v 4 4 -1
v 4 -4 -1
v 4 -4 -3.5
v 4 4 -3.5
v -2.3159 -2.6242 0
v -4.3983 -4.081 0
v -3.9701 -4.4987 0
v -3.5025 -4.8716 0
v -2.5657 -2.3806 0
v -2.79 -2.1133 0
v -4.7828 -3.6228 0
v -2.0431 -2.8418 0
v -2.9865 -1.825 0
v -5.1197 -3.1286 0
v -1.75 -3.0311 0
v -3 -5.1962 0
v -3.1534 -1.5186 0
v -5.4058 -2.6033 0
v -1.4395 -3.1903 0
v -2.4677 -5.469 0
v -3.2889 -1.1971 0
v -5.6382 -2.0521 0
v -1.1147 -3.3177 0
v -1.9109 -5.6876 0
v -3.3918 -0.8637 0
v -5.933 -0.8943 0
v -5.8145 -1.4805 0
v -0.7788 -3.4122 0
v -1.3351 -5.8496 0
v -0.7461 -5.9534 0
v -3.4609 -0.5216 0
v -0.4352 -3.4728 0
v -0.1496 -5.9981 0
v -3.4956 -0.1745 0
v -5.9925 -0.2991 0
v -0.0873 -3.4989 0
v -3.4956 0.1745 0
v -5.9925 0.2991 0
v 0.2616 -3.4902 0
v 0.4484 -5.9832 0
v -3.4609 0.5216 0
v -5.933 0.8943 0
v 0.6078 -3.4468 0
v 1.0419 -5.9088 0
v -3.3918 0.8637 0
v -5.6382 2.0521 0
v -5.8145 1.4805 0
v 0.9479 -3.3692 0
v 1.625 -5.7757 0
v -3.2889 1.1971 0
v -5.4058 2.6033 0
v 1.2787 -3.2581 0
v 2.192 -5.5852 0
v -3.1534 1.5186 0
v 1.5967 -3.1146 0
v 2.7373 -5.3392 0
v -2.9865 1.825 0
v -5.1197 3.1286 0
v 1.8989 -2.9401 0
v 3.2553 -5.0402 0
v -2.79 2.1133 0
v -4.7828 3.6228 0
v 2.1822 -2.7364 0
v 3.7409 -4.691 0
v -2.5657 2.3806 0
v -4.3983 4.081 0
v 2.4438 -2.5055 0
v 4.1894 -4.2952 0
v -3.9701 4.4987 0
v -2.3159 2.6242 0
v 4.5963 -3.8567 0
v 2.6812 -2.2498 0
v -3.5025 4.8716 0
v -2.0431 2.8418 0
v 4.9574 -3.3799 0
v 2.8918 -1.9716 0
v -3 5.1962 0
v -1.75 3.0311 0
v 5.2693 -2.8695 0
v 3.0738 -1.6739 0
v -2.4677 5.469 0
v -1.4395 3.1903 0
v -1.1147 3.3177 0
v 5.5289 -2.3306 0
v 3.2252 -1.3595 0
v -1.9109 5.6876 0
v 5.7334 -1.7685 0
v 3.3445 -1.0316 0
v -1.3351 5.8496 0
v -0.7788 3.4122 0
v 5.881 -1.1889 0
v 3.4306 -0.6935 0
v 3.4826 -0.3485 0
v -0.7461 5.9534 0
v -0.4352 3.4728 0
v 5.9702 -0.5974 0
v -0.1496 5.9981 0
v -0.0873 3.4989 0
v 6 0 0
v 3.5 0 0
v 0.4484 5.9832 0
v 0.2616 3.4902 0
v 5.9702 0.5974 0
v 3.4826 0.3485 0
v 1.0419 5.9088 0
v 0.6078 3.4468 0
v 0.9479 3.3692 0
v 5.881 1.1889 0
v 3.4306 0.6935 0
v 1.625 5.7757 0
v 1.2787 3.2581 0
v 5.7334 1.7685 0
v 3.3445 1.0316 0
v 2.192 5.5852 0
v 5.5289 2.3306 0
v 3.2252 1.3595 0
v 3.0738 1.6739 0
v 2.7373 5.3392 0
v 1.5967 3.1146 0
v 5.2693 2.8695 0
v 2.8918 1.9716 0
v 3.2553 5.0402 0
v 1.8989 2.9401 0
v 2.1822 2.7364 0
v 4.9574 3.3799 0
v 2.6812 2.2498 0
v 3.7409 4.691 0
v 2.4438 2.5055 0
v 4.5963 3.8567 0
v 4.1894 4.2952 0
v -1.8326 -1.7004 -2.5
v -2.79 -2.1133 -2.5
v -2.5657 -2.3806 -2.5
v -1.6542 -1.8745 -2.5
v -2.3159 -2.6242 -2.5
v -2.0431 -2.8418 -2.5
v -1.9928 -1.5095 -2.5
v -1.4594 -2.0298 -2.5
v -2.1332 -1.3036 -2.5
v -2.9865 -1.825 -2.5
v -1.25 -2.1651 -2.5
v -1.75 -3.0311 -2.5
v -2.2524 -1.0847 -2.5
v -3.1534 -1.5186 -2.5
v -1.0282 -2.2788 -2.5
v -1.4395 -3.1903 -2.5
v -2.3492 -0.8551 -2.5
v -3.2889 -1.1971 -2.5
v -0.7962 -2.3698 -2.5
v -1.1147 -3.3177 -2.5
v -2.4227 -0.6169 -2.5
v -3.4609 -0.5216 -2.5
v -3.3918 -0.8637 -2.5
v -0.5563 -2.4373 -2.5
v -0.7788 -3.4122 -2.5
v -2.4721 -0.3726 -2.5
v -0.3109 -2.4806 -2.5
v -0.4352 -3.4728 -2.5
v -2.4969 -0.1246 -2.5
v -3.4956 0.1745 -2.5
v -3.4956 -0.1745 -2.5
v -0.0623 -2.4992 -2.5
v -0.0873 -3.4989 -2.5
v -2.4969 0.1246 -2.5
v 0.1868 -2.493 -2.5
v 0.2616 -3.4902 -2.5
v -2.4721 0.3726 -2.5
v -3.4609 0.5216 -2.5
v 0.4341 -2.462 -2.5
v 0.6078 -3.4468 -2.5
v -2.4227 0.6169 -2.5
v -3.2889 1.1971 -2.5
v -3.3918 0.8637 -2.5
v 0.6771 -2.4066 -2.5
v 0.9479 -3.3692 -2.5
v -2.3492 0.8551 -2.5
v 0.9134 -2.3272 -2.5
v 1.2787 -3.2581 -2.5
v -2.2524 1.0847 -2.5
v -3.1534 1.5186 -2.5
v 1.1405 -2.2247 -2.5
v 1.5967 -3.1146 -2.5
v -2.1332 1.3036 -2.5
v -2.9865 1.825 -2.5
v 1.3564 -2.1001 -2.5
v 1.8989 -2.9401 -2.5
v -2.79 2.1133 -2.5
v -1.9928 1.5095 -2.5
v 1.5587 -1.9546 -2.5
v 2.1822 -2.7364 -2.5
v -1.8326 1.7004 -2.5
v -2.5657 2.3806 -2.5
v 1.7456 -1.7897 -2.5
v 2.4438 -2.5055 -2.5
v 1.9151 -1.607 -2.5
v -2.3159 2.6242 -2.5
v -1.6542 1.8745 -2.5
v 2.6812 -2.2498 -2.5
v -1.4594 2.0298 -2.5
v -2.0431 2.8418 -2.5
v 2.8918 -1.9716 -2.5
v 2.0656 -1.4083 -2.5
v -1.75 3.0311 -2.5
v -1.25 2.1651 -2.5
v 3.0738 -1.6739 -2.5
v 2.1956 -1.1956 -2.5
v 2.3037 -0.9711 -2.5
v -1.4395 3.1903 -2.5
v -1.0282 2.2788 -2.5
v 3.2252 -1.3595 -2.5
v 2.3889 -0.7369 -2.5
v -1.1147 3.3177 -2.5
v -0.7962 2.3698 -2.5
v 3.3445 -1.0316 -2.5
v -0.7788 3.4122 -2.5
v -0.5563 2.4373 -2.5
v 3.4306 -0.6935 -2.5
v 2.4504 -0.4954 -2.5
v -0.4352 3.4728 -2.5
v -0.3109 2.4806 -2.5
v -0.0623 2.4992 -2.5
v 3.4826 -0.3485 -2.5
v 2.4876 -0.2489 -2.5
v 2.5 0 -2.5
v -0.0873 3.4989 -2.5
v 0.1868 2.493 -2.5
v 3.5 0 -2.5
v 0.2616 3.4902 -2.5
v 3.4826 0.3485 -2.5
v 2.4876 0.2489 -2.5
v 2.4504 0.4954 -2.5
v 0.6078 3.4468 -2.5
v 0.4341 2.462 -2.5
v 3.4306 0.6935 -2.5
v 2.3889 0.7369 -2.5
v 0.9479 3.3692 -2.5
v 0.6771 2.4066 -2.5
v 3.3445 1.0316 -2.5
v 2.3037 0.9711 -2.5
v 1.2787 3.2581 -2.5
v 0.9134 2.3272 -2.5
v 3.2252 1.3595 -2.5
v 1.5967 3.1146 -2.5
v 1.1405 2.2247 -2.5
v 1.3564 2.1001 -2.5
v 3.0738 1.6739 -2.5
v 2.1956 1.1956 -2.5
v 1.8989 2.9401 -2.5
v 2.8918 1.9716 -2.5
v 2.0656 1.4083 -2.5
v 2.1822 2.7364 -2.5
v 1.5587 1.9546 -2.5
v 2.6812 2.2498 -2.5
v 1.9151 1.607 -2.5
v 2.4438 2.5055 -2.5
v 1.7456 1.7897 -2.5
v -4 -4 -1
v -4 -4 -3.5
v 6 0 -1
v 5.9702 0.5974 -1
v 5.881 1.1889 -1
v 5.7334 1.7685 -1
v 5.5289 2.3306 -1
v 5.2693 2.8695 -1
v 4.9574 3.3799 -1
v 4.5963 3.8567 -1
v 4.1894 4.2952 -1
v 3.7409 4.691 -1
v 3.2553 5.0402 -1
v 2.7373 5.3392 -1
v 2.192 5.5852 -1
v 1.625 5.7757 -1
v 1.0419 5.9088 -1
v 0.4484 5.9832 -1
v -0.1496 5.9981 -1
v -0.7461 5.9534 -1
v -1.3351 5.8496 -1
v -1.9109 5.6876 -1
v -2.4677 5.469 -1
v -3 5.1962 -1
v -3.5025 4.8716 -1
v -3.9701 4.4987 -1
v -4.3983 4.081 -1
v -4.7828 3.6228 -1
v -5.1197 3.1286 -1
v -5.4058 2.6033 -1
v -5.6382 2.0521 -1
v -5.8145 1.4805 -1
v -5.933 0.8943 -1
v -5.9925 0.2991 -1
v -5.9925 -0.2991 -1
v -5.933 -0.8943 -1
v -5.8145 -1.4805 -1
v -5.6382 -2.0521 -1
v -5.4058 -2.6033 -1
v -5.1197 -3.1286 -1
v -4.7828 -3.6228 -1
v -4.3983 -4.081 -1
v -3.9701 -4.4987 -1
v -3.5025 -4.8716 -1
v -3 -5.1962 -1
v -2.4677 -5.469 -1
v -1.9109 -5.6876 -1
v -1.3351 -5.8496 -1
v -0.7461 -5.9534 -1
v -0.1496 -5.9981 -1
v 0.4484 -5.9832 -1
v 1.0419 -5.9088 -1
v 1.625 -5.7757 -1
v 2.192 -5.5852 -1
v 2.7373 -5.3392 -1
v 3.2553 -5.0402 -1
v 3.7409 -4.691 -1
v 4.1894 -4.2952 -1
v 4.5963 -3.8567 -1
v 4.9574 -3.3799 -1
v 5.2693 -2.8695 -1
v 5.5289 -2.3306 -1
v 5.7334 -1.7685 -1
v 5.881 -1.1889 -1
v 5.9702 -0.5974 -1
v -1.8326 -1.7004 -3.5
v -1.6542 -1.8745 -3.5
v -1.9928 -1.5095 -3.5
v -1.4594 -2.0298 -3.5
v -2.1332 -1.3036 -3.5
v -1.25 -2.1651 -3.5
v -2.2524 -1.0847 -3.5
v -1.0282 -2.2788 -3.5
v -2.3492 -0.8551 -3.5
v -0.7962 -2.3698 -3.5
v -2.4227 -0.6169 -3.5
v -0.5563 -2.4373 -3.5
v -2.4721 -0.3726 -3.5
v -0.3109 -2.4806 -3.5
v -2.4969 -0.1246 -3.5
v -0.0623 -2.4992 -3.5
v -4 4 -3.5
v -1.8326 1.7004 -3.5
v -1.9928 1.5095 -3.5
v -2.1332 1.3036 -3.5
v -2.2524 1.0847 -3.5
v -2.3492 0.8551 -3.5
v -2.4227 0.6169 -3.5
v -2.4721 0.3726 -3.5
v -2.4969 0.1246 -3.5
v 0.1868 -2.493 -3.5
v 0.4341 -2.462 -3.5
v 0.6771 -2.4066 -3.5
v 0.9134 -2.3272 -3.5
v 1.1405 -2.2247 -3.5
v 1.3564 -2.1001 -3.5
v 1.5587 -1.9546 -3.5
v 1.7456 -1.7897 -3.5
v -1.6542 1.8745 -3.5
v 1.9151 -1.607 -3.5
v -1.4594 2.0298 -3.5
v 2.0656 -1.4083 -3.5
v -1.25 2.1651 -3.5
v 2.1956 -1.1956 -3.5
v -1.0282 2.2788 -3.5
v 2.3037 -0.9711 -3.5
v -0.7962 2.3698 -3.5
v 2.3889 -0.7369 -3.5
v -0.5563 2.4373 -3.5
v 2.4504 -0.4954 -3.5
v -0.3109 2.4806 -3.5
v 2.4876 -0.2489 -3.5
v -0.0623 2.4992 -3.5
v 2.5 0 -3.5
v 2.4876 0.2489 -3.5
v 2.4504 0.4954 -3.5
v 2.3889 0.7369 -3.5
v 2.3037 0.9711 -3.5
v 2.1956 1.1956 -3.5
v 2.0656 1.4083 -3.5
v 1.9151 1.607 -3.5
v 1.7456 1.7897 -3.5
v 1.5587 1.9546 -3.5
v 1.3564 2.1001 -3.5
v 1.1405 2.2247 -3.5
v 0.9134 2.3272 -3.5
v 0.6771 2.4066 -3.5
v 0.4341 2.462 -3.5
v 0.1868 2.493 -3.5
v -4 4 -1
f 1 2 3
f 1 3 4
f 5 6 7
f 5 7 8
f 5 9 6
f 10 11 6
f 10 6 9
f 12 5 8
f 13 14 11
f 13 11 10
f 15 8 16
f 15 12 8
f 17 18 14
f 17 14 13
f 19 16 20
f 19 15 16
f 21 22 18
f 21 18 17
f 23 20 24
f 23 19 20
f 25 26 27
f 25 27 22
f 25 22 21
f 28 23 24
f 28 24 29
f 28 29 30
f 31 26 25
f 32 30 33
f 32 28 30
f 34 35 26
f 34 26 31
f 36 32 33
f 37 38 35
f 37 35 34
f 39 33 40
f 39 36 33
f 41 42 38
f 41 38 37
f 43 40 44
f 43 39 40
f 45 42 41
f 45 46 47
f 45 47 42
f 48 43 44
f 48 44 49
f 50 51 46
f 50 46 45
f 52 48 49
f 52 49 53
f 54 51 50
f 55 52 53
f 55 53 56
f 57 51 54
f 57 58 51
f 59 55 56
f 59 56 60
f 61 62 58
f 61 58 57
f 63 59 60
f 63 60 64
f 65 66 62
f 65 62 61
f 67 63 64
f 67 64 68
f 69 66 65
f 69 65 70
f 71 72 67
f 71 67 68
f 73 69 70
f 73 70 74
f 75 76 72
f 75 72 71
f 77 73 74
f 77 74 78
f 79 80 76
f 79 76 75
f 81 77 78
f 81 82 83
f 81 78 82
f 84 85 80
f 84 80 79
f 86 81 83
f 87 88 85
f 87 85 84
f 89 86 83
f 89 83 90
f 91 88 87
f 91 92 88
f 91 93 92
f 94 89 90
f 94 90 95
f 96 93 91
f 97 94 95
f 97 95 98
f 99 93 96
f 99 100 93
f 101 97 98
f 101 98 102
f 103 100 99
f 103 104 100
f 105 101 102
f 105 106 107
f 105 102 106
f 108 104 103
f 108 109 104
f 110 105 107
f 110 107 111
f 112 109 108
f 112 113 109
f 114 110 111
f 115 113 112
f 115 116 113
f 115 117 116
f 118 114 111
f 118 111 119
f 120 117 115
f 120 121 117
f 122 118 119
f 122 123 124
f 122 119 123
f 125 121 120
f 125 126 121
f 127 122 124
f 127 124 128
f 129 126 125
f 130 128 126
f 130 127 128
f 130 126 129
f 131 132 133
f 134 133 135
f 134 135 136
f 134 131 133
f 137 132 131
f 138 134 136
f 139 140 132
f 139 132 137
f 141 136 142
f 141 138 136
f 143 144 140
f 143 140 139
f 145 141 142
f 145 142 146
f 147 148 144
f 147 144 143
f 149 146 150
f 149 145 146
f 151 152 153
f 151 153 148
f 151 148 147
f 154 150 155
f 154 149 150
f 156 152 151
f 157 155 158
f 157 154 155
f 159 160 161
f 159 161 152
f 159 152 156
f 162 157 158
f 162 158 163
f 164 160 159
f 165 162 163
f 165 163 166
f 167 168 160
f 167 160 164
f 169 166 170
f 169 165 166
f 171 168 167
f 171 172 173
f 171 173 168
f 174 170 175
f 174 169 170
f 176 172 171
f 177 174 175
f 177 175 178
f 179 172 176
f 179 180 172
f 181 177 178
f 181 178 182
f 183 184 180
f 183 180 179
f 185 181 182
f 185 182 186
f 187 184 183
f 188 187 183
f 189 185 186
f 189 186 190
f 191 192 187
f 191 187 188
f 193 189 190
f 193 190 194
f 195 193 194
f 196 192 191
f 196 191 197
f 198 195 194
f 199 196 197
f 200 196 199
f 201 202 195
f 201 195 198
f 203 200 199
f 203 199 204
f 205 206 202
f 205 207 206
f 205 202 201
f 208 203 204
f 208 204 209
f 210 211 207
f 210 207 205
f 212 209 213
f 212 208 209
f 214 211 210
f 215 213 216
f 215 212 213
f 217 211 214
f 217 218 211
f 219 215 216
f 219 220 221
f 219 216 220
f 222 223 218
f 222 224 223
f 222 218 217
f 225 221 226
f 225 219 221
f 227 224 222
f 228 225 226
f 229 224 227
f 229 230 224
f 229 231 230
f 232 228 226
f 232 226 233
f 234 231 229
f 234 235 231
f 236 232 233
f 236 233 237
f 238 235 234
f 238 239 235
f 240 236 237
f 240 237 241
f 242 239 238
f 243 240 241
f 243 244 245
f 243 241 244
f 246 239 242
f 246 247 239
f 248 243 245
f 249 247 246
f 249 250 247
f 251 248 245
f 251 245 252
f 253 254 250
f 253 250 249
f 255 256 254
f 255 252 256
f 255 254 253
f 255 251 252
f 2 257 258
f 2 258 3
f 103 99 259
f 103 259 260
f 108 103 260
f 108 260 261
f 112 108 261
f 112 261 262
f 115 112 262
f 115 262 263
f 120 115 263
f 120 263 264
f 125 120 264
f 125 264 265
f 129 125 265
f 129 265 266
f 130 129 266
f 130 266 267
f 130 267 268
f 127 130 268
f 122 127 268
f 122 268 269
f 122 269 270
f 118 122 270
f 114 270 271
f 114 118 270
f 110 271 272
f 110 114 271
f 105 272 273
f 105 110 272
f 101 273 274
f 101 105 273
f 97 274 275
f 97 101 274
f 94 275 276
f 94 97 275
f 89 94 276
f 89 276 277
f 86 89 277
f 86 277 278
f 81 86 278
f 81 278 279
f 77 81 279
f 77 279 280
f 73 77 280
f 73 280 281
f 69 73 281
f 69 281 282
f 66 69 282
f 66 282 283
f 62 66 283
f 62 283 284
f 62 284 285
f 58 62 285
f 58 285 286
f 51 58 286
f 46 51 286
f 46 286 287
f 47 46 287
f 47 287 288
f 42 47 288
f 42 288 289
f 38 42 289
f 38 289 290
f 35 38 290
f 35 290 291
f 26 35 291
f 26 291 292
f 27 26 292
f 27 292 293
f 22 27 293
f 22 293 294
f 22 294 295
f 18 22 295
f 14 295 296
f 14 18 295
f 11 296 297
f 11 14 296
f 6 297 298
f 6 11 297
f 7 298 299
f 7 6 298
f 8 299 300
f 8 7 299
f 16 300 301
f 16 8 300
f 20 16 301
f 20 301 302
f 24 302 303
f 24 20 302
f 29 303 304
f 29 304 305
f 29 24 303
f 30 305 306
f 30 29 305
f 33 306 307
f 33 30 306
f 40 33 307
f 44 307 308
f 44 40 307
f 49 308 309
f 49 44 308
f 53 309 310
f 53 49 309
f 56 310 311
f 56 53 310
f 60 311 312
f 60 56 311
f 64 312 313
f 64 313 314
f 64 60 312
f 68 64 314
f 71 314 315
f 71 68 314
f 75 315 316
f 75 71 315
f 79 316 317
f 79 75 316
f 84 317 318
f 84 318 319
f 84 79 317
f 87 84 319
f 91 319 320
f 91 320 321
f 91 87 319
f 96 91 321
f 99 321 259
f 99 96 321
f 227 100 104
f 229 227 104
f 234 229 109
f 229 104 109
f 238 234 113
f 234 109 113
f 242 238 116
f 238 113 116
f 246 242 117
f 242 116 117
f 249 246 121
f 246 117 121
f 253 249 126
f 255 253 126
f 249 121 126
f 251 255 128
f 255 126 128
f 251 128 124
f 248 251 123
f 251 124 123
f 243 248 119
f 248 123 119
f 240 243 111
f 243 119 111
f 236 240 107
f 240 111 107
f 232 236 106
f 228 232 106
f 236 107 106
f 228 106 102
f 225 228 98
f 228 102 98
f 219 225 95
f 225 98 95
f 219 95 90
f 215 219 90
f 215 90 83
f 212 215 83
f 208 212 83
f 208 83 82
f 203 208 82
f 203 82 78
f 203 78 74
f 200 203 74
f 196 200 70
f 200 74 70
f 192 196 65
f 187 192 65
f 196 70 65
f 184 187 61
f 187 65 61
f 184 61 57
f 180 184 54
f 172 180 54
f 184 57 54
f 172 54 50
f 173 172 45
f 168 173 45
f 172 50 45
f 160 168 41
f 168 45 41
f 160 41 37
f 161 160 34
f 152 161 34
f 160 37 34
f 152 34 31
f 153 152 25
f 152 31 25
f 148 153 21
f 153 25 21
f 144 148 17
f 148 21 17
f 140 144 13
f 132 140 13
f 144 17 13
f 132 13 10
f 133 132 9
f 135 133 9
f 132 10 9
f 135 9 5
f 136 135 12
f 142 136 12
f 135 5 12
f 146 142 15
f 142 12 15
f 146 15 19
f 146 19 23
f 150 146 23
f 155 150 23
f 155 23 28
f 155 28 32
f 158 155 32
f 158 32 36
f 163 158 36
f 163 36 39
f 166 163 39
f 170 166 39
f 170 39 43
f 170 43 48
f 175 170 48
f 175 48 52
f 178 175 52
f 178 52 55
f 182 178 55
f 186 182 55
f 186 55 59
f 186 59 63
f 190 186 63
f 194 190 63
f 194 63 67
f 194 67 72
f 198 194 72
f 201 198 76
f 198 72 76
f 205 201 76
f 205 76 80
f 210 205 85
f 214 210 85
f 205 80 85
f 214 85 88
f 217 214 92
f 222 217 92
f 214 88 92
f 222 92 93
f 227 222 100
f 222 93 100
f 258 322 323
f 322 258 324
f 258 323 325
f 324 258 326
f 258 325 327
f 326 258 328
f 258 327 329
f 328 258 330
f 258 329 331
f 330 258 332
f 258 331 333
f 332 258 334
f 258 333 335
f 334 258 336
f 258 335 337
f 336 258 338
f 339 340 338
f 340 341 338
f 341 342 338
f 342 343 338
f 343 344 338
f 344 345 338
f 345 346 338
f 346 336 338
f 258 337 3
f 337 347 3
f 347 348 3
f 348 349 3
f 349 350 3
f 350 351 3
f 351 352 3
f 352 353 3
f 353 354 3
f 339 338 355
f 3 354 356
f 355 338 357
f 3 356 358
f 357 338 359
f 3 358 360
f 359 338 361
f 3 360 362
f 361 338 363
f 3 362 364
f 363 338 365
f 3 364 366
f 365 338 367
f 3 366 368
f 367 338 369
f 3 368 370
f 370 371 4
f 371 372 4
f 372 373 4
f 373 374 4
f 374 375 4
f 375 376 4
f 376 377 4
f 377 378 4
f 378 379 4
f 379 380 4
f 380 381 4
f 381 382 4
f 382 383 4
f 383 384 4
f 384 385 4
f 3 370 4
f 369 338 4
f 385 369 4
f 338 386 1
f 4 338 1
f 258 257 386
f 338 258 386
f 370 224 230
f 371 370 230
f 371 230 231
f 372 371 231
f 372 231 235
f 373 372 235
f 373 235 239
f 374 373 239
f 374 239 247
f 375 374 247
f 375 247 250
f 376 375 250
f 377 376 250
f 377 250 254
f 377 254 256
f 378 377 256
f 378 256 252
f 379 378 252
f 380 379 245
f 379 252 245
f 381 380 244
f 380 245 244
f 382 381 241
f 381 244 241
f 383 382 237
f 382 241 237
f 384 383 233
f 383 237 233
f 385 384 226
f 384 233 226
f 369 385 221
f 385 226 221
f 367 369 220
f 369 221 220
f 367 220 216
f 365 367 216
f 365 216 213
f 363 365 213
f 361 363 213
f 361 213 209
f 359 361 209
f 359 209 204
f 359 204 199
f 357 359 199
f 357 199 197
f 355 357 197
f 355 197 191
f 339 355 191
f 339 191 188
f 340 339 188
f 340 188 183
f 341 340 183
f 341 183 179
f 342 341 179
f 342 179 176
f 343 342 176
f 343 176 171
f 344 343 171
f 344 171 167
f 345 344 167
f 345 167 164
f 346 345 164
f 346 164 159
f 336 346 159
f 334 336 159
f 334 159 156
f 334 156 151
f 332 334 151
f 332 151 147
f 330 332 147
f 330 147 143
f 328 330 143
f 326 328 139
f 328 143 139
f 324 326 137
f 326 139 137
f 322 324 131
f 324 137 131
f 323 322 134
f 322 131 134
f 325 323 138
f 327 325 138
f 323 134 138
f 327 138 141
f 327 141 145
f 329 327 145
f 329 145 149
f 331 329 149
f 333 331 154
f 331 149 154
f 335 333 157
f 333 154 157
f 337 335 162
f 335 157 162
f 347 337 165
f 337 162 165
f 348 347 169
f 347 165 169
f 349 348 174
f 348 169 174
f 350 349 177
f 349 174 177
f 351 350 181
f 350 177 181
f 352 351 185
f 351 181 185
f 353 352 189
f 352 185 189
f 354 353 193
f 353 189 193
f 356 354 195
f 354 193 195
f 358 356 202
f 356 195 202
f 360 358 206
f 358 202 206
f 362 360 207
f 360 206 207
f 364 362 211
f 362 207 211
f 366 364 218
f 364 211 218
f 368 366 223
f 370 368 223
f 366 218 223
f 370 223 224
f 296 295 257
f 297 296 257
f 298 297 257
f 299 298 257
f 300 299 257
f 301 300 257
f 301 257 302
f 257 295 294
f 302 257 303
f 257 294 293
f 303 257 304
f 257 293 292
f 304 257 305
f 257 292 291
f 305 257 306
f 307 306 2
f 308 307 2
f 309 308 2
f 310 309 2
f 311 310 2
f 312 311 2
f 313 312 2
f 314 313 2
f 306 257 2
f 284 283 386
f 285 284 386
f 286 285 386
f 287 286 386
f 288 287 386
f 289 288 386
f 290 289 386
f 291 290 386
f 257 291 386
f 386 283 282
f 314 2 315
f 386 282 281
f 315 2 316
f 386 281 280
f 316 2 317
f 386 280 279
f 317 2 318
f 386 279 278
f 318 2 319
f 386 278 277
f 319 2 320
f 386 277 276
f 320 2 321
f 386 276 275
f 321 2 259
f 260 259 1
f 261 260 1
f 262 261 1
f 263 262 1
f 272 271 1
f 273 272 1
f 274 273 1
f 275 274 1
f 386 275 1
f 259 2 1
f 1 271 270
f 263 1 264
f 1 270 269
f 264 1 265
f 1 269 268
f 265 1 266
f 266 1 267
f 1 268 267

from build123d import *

# Parameters (mm, degrees)
SKIZZE1_R                       = 6
AUFSATZ_LINEAR_AUSTRAGEN1_DEPTH = 3.5
SKIZZE1_3_R                     = 3.5
SCHNITT_LINEAR_AUSTRAGEN1_DEPTH = 2.5
SKIZZE1_4_R                     = 2.5
SCHNITT_LINEAR_AUSTRAGEN3_DEPTH = 4.5
SCHNITT_LINEAR_START            = -1
SKIZZE1_5_OUTSIDE_W             = 17.466
SKIZZE1_5_OUTSIDE_H             = 17.466
SKIZZE1_5_OUTSIDE_W_2           = 8
SKIZZE1_5_OUTSIDE_H_2           = 8
SCHNITT_LINEAR_AUSTRAGEN4_DEPTH = 3.5


with BuildPart() as part:
    # Skizze1 → Aufsatz-Linear austragen1 (new body)
    with BuildSketch(Plane.XY):
        Circle(SKIZZE1_R)
    extrude(amount=-AUFSATZ_LINEAR_AUSTRAGEN1_DEPTH)

    # Skizze1<3> → Schnitt-Linear austragen1 (cut)
    with BuildSketch(Plane.XY):
        Circle(SKIZZE1_3_R)
    extrude(amount=-SCHNITT_LINEAR_AUSTRAGEN1_DEPTH, mode=Mode.SUBTRACT)

    # Skizze1<4> → Schnitt-Linear austragen3 (cut, through all)
    with BuildSketch(Plane.XY):
        Circle(SKIZZE1_4_R)
    extrude(amount=-SCHNITT_LINEAR_AUSTRAGEN3_DEPTH, mode=Mode.SUBTRACT)

    # Skizze1<5> outside → Schnitt-Linear austragen4 (cut, through all)
    with BuildSketch(Plane.XY.offset(SCHNITT_LINEAR_START)):
        Rectangle(SKIZZE1_5_OUTSIDE_W, SKIZZE1_5_OUTSIDE_H)
        Rectangle(SKIZZE1_5_OUTSIDE_W_2, SKIZZE1_5_OUTSIDE_H_2, mode=Mode.SUBTRACT)
    extrude(amount=-SCHNITT_LINEAR_AUSTRAGEN4_DEPTH, mode=Mode.SUBTRACT)


solid = part.part
